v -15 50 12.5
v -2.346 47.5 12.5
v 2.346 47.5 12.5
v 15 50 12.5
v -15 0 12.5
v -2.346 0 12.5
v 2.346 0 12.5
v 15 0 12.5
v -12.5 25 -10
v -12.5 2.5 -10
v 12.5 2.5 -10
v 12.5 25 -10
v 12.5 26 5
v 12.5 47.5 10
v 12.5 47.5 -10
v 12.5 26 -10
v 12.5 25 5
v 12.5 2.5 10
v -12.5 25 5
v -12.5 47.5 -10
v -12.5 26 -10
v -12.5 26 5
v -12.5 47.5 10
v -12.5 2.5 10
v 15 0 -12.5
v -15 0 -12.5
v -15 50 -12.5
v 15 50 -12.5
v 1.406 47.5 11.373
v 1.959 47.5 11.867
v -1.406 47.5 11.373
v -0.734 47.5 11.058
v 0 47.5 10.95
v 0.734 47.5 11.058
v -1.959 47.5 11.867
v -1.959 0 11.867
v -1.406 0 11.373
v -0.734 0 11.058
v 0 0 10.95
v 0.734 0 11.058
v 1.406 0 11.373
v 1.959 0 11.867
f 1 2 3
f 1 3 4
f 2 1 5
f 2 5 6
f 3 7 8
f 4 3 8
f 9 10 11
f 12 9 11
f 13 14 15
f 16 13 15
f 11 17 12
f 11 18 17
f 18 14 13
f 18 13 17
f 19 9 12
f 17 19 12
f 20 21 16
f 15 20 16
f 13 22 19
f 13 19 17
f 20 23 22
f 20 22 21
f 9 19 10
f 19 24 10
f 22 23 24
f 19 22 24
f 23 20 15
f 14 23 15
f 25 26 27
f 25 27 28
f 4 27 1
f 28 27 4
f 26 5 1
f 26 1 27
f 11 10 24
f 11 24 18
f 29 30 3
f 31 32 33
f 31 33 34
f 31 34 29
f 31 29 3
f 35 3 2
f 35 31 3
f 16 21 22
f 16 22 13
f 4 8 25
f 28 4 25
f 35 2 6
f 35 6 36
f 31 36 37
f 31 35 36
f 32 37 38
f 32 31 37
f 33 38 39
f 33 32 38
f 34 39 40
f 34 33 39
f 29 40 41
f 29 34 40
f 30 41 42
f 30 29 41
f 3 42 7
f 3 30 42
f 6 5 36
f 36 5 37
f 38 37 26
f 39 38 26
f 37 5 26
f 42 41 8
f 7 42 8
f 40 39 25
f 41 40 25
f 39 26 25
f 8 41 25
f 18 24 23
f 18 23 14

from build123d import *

# Parameters (mm, degrees)
SKETCH1_W           = 30
SKETCH1_H           = 25
BOSS_EXTRUDE1_DEPTH = 50
CUT_EXTRUDE2_START  = 2.5
SKETCH1_5_W         = 25
SKETCH1_5_H         = 20
CUT_EXTRUDE2_DEPTH  = 45
BOSS_EXTRUDE3_START = 25
SKETCH1_6_W         = 25
SKETCH1_6_H         = 20
BOSS_EXTRUDE3_DEPTH = 1
SKETCH2_R           = 2.55
CUT_EXTRUDE3_DEPTH  = 47.5
SKETCH4_W           = 25
SKETCH4_H           = 5
CUT_EXTRUDE4_DEPTH  = 1


with BuildPart() as part:
    # Sketch1 → Boss-Extrude1 (new body)
    with BuildSketch(Plane(origin=(0, 0, 0), x_dir=(1, 0, 0), z_dir=(0, 1, 0))):
        Rectangle(SKETCH1_W, SKETCH1_H)
    extrude(amount=BOSS_EXTRUDE1_DEPTH)

    # Sketch1<5> → Cut-Extrude2 (cut)
    with BuildSketch(Plane(origin=(0, 0, 0), x_dir=(1, 0, 0), z_dir=(0, 1, 0)).offset(CUT_EXTRUDE2_START)):
        Rectangle(SKETCH1_5_W, SKETCH1_5_H)
    extrude(amount=CUT_EXTRUDE2_DEPTH, mode=Mode.SUBTRACT)

    # Sketch1<6> → Boss-Extrude3 (add)
    with BuildSketch(Plane(origin=(0, 0, 0), x_dir=(1, 0, 0), z_dir=(0, 1, 0)).offset(BOSS_EXTRUDE3_START)):
        Rectangle(SKETCH1_6_W, SKETCH1_6_H)
    extrude(amount=BOSS_EXTRUDE3_DEPTH)

    # Sketch2 → Cut-Extrude3 (cut)
    with BuildSketch(Plane(origin=(0, 47.5, 0), x_dir=(-1, 0, 0), z_dir=(0, -1, 0))):
        with Locations((0, -13.5)):
            Circle(SKETCH2_R)
    extrude(amount=CUT_EXTRUDE3_DEPTH, mode=Mode.SUBTRACT)

    # Sketch4 → Cut-Extrude4 (cut)
    with BuildSketch(Plane(origin=(0, 26, 0), x_dir=(1, 0, 0), z_dir=(0, 1, 0))):
        with Locations((0, -7.5)):
            Rectangle(SKETCH4_W, SKETCH4_H)
    extrude(amount=-CUT_EXTRUDE4_DEPTH, mode=Mode.SUBTRACT)


solid = part.part
